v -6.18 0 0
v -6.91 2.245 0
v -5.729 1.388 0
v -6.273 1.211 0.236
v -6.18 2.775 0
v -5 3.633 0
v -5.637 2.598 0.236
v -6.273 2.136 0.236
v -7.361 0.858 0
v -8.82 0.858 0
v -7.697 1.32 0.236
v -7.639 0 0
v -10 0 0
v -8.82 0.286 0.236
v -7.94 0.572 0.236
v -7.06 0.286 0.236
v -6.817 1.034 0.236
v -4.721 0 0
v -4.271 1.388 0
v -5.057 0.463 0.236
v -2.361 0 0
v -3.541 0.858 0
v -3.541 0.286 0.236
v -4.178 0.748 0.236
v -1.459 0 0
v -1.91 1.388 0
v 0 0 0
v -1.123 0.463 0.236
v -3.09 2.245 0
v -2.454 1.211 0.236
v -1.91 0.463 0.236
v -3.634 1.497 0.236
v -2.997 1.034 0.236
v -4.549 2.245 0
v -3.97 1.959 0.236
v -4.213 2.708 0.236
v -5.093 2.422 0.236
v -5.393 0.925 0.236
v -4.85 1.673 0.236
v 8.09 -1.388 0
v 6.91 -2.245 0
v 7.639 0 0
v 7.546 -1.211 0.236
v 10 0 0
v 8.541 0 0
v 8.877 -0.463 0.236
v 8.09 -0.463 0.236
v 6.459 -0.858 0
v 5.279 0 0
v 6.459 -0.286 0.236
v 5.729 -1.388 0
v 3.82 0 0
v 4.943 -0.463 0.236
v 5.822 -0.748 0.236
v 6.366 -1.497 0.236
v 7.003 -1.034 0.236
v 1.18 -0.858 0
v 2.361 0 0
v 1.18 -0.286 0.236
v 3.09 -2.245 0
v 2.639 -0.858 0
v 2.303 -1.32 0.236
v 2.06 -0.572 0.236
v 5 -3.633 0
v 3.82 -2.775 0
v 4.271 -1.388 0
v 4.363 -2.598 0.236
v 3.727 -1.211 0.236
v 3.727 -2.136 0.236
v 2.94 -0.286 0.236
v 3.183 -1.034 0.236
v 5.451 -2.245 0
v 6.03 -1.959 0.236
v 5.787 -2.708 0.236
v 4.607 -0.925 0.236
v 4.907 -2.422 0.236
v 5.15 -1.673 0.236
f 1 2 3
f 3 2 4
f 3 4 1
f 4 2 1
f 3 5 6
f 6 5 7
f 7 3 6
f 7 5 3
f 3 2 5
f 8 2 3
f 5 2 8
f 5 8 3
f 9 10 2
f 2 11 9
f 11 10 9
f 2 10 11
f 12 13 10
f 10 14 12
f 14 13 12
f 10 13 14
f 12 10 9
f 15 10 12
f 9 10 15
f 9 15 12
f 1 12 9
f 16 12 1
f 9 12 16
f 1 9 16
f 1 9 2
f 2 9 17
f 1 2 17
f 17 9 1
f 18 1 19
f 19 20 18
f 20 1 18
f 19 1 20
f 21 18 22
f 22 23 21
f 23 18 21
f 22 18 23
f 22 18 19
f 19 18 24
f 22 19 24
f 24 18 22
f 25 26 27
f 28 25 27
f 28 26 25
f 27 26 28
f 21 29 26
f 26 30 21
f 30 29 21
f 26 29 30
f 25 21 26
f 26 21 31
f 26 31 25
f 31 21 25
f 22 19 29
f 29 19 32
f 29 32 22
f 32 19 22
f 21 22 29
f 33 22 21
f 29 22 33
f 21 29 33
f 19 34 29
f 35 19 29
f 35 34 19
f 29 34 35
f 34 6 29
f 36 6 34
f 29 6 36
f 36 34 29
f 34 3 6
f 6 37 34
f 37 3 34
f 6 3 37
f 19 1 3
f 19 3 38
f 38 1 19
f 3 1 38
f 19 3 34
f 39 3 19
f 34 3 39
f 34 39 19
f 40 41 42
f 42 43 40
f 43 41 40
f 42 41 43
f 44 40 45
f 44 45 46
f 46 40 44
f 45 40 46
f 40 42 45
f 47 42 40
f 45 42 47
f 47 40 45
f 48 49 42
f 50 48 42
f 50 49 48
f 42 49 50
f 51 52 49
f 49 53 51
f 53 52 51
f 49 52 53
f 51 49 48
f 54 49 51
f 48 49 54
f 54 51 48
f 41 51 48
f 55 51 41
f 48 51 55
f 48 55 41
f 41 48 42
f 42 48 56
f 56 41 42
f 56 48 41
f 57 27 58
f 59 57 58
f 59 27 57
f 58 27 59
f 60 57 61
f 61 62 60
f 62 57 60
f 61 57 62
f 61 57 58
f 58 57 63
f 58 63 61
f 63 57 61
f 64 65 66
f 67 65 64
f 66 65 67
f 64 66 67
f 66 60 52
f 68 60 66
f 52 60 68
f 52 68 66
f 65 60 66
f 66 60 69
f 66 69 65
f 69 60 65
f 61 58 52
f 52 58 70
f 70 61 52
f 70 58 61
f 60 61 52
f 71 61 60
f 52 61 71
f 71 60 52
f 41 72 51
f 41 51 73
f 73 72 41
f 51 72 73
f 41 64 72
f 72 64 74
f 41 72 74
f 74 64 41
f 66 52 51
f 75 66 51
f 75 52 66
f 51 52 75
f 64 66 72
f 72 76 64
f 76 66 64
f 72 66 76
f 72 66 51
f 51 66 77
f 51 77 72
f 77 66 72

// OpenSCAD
//http://tilings.math.uni-bielefeld.de/substitution/robinson-triangle/
//diagram:https://tilings.math.uni-bielefeld.de/img/substitution/robinson-triangle/rule.gif
//location refers to location of rightmost vertex in diagram
//orientation refers to orientation rotated in degrees compared to diagram about the rightmost corner
//level refers to how deep the substitutions go
// size refers to size of largest edge

phi = (1+pow(5,0.5))/2;
height =1;
maxLevel = 3;

orange = [255,165,0]/255;
gold = [255,215,0]/255;
darkblue = [0,0,139]/255;
lightblue = [173,216,230]/255;


function lerp (a,b,t) = a+((b-a)*t);
// Smoothstep function
function smoothStep(edge0,edge1,x) = let(y = clamp((x-edge0)/(edge1-edge0))) y*y*(3-2*y);
function clamp(x,lowerLimit=0,upperLimit=1) = (x<lowerLimit) ? lowerLimit : ((x>upperLimit) ? upperLimit : x);
function getCentroid (triangle) = (triangle[0]+triangle[1]+triangle[2])/3;
function sumElem(a) = [for (sum=a[0],i=1; i<=len(a); newsum=sum+a[i], nexti=i+1, sum=newsum, i=nexti) sum];
//left fat triangle refers to dark blue triangle in diagram
module leftfatTriangleDeflation (triangleList,Level,colorList,heightList){
colorListOut = concat([darkblue],colorList);
  if (Level == 0) {
    renderPyramid(triangleList,colorListOut,heightList);
  } else {
    heightListOut = concat([heightList[0]/phi],heightList);
    point0 = triangleList[0][0];
    point1 = lerp(triangleList[0][0],triangleList[0][1],1/phi);
    point2 = triangleList[0][1];
    point3 = triangleList[0][2];
    point4 = lerp(triangleList[0][0],triangleList[0][2],1/phi);
    leftFatList = concat([[point3,point4,point2]],triangleList);
    rightFatList = concat([[point4,point0,point1]],triangleList);
    rightSkinnyList = concat([[point1,point2,point4]],triangleList);
    leftfatTriangleDeflation(leftFatList,Level-1,colorListOut,heightListOut);
    rightfatTriangleDeflation(rightFatList,Level-1,colorListOut,heightListOut);
    rightskinnyTriangleDeflation(rightSkinnyList,Level-1,colorListOut,heightListOut);
  }
}
//left skinny triangle refers to light orange triangle in diagram
module leftskinnyTriangleDeflation (triangleList,Level,colorList,heightList){
  colorListOut = concat([gold],colorList);
  if (Level == 0) {
    renderPyramid(triangleList,colorListOut,heightList);
  } else {
    heightListOut = concat([heightList[0]/phi],heightList);
    point0 = triangleList[0][0];
    point1 = lerp(triangleList[0][1],triangleList[0][0],1/phi);
    point2 = triangleList[0][1];
    point3 = triangleList[0][2];
    LeftSkinnyList = concat([[point1,point3,point0]],triangleList);
    LeftFatList = concat([[point3,point1,point2]],triangleList);
    leftskinnyTriangleDeflation(LeftSkinnyList,Level-1,colorListOut,heightListOut);
    leftfatTriangleDeflation(LeftFatList,Level-1,colorListOut,heightListOut);
  }
}
//right fat triangle refers to light blue triangle in diagram
module rightfatTriangleDeflation (triangleList,Level,colorList,heightList){
    colorListOut = concat([lightblue],colorList);
    if (Level == 0) {
    renderPyramid(triangleList,colorListOut,heightList);
  } else {
    heightListOut = concat([heightList[0]/phi],heightList);
    point0 = triangleList[0][0];
    point1 = lerp(triangleList[0][0],triangleList[0][1],1/phi);
    point2 = triangleList[0][1];
    point3 = triangleList[0][2];
    point4 = lerp(triangleList[0][0],triangleList[0][2],1/phi);
    leftFatList = concat([[point1,point4,point0]],triangleList);
    rightFatList = concat([[point2,point3,point1]],triangleList);
    leftSkinnyList = concat([[point4,point1,point3]],triangleList);
    leftfatTriangleDeflation(leftFatList,Level-1,colorListOut,heightListOut);
    rightfatTriangleDeflation(rightFatList,Level-1,colorListOut,heightListOut);
    leftskinnyTriangleDeflation(leftSkinnyList,Level-1,colorListOut,heightListOut);
  }
}
//right skinny triangle refers to dark orange triangle in diagram
module rightskinnyTriangleDeflation (triangleList,Level,colorList,heightList){
    colorListOut = concat([orange],colorList);
    if (Level == 0) {
    renderPyramid(triangleList,colorListOut,heightList);
  } else {
    heightListOut = concat([heightList[0]/phi],heightList);
    point0 = triangleList[0][0];
    point1 = triangleList[0][1];
    point2 = triangleList[0][2];
    point3 = lerp(triangleList[0][2],triangleList[0][0],1/phi);
    rightSkinnyList = concat([[point3,point0,point1]],triangleList);
    rightFatList =  concat([[point1,point2,point3]],triangleList);
    rightskinnyTriangleDeflation(rightSkinnyList,Level-1,colorListOut,heightListOut);
    rightfatTriangleDeflation(rightFatList,Level-1,colorListOut,heightListOut);
  }
}

module renderPyramid (triangleList,colorList,heightList){
  renderLinearAnimatedPyramid(triangleList,colorList,heightList);
}
function nomute(i,t,l=maxLevel) = i/l<=t && (i+l) >t;
function getlinearLookup (itemlist,t,i) = lerp(itemlist[i],itemlist[i+1],clamp((len(itemlist)-1)*t-i));
module renderLinearAnimatedPyramid (triangleList,colorList,heightList) {
  points = triangleList[0];
  centroidList = [ for (i = [0:len(triangleList)-1]) [getCentroid(triangleList[i])[0],getCentroid(triangleList[i])[1],heightList[i]]];
  centroid = getlinearLookup(centroidList,$t,floor($t*maxLevel));
  points3d = concat(points,[centroid]);
  faces = [[0,1,2],[0,3,1],[1,3,2],[2,3,0]];
  animatedColor =getlinearLookup(colorList,$t,floor($t*maxLevel));
  color(animatedColor)polyhedron(points3d,faces);
}
module renderStaticPyramid (triangleList,colorList){
  points = triangleList[0];
  centroid = [getCentroid(points)[0],getCentroid(points)[1],1];
  points3d = concat(points,[centroid]);
  faces = [[0,1,2],[0,3,1],[1,3,2],[2,3,0]];
  color(colorList[0])polyhedron(points3d,faces,1);
}


translate([0,0,0])leftfatTriangleDeflation([[[0,0,0],[-5,sin(36)*10/phi,0],[-10,0,0]]],maxLevel,[],[height]);
translate([10,0,0])rightfatTriangleDeflation([[[0,0,0],[-10,0,0],[-5,-sin(36)*10/phi,0]]],maxLevel,[],[height]);
//translate([20,0,0])leftskinnyTriangleDeflation(maxLevel);
//translate([30,0,0])rightskinnyTriangleDeflation(maxLevel);
